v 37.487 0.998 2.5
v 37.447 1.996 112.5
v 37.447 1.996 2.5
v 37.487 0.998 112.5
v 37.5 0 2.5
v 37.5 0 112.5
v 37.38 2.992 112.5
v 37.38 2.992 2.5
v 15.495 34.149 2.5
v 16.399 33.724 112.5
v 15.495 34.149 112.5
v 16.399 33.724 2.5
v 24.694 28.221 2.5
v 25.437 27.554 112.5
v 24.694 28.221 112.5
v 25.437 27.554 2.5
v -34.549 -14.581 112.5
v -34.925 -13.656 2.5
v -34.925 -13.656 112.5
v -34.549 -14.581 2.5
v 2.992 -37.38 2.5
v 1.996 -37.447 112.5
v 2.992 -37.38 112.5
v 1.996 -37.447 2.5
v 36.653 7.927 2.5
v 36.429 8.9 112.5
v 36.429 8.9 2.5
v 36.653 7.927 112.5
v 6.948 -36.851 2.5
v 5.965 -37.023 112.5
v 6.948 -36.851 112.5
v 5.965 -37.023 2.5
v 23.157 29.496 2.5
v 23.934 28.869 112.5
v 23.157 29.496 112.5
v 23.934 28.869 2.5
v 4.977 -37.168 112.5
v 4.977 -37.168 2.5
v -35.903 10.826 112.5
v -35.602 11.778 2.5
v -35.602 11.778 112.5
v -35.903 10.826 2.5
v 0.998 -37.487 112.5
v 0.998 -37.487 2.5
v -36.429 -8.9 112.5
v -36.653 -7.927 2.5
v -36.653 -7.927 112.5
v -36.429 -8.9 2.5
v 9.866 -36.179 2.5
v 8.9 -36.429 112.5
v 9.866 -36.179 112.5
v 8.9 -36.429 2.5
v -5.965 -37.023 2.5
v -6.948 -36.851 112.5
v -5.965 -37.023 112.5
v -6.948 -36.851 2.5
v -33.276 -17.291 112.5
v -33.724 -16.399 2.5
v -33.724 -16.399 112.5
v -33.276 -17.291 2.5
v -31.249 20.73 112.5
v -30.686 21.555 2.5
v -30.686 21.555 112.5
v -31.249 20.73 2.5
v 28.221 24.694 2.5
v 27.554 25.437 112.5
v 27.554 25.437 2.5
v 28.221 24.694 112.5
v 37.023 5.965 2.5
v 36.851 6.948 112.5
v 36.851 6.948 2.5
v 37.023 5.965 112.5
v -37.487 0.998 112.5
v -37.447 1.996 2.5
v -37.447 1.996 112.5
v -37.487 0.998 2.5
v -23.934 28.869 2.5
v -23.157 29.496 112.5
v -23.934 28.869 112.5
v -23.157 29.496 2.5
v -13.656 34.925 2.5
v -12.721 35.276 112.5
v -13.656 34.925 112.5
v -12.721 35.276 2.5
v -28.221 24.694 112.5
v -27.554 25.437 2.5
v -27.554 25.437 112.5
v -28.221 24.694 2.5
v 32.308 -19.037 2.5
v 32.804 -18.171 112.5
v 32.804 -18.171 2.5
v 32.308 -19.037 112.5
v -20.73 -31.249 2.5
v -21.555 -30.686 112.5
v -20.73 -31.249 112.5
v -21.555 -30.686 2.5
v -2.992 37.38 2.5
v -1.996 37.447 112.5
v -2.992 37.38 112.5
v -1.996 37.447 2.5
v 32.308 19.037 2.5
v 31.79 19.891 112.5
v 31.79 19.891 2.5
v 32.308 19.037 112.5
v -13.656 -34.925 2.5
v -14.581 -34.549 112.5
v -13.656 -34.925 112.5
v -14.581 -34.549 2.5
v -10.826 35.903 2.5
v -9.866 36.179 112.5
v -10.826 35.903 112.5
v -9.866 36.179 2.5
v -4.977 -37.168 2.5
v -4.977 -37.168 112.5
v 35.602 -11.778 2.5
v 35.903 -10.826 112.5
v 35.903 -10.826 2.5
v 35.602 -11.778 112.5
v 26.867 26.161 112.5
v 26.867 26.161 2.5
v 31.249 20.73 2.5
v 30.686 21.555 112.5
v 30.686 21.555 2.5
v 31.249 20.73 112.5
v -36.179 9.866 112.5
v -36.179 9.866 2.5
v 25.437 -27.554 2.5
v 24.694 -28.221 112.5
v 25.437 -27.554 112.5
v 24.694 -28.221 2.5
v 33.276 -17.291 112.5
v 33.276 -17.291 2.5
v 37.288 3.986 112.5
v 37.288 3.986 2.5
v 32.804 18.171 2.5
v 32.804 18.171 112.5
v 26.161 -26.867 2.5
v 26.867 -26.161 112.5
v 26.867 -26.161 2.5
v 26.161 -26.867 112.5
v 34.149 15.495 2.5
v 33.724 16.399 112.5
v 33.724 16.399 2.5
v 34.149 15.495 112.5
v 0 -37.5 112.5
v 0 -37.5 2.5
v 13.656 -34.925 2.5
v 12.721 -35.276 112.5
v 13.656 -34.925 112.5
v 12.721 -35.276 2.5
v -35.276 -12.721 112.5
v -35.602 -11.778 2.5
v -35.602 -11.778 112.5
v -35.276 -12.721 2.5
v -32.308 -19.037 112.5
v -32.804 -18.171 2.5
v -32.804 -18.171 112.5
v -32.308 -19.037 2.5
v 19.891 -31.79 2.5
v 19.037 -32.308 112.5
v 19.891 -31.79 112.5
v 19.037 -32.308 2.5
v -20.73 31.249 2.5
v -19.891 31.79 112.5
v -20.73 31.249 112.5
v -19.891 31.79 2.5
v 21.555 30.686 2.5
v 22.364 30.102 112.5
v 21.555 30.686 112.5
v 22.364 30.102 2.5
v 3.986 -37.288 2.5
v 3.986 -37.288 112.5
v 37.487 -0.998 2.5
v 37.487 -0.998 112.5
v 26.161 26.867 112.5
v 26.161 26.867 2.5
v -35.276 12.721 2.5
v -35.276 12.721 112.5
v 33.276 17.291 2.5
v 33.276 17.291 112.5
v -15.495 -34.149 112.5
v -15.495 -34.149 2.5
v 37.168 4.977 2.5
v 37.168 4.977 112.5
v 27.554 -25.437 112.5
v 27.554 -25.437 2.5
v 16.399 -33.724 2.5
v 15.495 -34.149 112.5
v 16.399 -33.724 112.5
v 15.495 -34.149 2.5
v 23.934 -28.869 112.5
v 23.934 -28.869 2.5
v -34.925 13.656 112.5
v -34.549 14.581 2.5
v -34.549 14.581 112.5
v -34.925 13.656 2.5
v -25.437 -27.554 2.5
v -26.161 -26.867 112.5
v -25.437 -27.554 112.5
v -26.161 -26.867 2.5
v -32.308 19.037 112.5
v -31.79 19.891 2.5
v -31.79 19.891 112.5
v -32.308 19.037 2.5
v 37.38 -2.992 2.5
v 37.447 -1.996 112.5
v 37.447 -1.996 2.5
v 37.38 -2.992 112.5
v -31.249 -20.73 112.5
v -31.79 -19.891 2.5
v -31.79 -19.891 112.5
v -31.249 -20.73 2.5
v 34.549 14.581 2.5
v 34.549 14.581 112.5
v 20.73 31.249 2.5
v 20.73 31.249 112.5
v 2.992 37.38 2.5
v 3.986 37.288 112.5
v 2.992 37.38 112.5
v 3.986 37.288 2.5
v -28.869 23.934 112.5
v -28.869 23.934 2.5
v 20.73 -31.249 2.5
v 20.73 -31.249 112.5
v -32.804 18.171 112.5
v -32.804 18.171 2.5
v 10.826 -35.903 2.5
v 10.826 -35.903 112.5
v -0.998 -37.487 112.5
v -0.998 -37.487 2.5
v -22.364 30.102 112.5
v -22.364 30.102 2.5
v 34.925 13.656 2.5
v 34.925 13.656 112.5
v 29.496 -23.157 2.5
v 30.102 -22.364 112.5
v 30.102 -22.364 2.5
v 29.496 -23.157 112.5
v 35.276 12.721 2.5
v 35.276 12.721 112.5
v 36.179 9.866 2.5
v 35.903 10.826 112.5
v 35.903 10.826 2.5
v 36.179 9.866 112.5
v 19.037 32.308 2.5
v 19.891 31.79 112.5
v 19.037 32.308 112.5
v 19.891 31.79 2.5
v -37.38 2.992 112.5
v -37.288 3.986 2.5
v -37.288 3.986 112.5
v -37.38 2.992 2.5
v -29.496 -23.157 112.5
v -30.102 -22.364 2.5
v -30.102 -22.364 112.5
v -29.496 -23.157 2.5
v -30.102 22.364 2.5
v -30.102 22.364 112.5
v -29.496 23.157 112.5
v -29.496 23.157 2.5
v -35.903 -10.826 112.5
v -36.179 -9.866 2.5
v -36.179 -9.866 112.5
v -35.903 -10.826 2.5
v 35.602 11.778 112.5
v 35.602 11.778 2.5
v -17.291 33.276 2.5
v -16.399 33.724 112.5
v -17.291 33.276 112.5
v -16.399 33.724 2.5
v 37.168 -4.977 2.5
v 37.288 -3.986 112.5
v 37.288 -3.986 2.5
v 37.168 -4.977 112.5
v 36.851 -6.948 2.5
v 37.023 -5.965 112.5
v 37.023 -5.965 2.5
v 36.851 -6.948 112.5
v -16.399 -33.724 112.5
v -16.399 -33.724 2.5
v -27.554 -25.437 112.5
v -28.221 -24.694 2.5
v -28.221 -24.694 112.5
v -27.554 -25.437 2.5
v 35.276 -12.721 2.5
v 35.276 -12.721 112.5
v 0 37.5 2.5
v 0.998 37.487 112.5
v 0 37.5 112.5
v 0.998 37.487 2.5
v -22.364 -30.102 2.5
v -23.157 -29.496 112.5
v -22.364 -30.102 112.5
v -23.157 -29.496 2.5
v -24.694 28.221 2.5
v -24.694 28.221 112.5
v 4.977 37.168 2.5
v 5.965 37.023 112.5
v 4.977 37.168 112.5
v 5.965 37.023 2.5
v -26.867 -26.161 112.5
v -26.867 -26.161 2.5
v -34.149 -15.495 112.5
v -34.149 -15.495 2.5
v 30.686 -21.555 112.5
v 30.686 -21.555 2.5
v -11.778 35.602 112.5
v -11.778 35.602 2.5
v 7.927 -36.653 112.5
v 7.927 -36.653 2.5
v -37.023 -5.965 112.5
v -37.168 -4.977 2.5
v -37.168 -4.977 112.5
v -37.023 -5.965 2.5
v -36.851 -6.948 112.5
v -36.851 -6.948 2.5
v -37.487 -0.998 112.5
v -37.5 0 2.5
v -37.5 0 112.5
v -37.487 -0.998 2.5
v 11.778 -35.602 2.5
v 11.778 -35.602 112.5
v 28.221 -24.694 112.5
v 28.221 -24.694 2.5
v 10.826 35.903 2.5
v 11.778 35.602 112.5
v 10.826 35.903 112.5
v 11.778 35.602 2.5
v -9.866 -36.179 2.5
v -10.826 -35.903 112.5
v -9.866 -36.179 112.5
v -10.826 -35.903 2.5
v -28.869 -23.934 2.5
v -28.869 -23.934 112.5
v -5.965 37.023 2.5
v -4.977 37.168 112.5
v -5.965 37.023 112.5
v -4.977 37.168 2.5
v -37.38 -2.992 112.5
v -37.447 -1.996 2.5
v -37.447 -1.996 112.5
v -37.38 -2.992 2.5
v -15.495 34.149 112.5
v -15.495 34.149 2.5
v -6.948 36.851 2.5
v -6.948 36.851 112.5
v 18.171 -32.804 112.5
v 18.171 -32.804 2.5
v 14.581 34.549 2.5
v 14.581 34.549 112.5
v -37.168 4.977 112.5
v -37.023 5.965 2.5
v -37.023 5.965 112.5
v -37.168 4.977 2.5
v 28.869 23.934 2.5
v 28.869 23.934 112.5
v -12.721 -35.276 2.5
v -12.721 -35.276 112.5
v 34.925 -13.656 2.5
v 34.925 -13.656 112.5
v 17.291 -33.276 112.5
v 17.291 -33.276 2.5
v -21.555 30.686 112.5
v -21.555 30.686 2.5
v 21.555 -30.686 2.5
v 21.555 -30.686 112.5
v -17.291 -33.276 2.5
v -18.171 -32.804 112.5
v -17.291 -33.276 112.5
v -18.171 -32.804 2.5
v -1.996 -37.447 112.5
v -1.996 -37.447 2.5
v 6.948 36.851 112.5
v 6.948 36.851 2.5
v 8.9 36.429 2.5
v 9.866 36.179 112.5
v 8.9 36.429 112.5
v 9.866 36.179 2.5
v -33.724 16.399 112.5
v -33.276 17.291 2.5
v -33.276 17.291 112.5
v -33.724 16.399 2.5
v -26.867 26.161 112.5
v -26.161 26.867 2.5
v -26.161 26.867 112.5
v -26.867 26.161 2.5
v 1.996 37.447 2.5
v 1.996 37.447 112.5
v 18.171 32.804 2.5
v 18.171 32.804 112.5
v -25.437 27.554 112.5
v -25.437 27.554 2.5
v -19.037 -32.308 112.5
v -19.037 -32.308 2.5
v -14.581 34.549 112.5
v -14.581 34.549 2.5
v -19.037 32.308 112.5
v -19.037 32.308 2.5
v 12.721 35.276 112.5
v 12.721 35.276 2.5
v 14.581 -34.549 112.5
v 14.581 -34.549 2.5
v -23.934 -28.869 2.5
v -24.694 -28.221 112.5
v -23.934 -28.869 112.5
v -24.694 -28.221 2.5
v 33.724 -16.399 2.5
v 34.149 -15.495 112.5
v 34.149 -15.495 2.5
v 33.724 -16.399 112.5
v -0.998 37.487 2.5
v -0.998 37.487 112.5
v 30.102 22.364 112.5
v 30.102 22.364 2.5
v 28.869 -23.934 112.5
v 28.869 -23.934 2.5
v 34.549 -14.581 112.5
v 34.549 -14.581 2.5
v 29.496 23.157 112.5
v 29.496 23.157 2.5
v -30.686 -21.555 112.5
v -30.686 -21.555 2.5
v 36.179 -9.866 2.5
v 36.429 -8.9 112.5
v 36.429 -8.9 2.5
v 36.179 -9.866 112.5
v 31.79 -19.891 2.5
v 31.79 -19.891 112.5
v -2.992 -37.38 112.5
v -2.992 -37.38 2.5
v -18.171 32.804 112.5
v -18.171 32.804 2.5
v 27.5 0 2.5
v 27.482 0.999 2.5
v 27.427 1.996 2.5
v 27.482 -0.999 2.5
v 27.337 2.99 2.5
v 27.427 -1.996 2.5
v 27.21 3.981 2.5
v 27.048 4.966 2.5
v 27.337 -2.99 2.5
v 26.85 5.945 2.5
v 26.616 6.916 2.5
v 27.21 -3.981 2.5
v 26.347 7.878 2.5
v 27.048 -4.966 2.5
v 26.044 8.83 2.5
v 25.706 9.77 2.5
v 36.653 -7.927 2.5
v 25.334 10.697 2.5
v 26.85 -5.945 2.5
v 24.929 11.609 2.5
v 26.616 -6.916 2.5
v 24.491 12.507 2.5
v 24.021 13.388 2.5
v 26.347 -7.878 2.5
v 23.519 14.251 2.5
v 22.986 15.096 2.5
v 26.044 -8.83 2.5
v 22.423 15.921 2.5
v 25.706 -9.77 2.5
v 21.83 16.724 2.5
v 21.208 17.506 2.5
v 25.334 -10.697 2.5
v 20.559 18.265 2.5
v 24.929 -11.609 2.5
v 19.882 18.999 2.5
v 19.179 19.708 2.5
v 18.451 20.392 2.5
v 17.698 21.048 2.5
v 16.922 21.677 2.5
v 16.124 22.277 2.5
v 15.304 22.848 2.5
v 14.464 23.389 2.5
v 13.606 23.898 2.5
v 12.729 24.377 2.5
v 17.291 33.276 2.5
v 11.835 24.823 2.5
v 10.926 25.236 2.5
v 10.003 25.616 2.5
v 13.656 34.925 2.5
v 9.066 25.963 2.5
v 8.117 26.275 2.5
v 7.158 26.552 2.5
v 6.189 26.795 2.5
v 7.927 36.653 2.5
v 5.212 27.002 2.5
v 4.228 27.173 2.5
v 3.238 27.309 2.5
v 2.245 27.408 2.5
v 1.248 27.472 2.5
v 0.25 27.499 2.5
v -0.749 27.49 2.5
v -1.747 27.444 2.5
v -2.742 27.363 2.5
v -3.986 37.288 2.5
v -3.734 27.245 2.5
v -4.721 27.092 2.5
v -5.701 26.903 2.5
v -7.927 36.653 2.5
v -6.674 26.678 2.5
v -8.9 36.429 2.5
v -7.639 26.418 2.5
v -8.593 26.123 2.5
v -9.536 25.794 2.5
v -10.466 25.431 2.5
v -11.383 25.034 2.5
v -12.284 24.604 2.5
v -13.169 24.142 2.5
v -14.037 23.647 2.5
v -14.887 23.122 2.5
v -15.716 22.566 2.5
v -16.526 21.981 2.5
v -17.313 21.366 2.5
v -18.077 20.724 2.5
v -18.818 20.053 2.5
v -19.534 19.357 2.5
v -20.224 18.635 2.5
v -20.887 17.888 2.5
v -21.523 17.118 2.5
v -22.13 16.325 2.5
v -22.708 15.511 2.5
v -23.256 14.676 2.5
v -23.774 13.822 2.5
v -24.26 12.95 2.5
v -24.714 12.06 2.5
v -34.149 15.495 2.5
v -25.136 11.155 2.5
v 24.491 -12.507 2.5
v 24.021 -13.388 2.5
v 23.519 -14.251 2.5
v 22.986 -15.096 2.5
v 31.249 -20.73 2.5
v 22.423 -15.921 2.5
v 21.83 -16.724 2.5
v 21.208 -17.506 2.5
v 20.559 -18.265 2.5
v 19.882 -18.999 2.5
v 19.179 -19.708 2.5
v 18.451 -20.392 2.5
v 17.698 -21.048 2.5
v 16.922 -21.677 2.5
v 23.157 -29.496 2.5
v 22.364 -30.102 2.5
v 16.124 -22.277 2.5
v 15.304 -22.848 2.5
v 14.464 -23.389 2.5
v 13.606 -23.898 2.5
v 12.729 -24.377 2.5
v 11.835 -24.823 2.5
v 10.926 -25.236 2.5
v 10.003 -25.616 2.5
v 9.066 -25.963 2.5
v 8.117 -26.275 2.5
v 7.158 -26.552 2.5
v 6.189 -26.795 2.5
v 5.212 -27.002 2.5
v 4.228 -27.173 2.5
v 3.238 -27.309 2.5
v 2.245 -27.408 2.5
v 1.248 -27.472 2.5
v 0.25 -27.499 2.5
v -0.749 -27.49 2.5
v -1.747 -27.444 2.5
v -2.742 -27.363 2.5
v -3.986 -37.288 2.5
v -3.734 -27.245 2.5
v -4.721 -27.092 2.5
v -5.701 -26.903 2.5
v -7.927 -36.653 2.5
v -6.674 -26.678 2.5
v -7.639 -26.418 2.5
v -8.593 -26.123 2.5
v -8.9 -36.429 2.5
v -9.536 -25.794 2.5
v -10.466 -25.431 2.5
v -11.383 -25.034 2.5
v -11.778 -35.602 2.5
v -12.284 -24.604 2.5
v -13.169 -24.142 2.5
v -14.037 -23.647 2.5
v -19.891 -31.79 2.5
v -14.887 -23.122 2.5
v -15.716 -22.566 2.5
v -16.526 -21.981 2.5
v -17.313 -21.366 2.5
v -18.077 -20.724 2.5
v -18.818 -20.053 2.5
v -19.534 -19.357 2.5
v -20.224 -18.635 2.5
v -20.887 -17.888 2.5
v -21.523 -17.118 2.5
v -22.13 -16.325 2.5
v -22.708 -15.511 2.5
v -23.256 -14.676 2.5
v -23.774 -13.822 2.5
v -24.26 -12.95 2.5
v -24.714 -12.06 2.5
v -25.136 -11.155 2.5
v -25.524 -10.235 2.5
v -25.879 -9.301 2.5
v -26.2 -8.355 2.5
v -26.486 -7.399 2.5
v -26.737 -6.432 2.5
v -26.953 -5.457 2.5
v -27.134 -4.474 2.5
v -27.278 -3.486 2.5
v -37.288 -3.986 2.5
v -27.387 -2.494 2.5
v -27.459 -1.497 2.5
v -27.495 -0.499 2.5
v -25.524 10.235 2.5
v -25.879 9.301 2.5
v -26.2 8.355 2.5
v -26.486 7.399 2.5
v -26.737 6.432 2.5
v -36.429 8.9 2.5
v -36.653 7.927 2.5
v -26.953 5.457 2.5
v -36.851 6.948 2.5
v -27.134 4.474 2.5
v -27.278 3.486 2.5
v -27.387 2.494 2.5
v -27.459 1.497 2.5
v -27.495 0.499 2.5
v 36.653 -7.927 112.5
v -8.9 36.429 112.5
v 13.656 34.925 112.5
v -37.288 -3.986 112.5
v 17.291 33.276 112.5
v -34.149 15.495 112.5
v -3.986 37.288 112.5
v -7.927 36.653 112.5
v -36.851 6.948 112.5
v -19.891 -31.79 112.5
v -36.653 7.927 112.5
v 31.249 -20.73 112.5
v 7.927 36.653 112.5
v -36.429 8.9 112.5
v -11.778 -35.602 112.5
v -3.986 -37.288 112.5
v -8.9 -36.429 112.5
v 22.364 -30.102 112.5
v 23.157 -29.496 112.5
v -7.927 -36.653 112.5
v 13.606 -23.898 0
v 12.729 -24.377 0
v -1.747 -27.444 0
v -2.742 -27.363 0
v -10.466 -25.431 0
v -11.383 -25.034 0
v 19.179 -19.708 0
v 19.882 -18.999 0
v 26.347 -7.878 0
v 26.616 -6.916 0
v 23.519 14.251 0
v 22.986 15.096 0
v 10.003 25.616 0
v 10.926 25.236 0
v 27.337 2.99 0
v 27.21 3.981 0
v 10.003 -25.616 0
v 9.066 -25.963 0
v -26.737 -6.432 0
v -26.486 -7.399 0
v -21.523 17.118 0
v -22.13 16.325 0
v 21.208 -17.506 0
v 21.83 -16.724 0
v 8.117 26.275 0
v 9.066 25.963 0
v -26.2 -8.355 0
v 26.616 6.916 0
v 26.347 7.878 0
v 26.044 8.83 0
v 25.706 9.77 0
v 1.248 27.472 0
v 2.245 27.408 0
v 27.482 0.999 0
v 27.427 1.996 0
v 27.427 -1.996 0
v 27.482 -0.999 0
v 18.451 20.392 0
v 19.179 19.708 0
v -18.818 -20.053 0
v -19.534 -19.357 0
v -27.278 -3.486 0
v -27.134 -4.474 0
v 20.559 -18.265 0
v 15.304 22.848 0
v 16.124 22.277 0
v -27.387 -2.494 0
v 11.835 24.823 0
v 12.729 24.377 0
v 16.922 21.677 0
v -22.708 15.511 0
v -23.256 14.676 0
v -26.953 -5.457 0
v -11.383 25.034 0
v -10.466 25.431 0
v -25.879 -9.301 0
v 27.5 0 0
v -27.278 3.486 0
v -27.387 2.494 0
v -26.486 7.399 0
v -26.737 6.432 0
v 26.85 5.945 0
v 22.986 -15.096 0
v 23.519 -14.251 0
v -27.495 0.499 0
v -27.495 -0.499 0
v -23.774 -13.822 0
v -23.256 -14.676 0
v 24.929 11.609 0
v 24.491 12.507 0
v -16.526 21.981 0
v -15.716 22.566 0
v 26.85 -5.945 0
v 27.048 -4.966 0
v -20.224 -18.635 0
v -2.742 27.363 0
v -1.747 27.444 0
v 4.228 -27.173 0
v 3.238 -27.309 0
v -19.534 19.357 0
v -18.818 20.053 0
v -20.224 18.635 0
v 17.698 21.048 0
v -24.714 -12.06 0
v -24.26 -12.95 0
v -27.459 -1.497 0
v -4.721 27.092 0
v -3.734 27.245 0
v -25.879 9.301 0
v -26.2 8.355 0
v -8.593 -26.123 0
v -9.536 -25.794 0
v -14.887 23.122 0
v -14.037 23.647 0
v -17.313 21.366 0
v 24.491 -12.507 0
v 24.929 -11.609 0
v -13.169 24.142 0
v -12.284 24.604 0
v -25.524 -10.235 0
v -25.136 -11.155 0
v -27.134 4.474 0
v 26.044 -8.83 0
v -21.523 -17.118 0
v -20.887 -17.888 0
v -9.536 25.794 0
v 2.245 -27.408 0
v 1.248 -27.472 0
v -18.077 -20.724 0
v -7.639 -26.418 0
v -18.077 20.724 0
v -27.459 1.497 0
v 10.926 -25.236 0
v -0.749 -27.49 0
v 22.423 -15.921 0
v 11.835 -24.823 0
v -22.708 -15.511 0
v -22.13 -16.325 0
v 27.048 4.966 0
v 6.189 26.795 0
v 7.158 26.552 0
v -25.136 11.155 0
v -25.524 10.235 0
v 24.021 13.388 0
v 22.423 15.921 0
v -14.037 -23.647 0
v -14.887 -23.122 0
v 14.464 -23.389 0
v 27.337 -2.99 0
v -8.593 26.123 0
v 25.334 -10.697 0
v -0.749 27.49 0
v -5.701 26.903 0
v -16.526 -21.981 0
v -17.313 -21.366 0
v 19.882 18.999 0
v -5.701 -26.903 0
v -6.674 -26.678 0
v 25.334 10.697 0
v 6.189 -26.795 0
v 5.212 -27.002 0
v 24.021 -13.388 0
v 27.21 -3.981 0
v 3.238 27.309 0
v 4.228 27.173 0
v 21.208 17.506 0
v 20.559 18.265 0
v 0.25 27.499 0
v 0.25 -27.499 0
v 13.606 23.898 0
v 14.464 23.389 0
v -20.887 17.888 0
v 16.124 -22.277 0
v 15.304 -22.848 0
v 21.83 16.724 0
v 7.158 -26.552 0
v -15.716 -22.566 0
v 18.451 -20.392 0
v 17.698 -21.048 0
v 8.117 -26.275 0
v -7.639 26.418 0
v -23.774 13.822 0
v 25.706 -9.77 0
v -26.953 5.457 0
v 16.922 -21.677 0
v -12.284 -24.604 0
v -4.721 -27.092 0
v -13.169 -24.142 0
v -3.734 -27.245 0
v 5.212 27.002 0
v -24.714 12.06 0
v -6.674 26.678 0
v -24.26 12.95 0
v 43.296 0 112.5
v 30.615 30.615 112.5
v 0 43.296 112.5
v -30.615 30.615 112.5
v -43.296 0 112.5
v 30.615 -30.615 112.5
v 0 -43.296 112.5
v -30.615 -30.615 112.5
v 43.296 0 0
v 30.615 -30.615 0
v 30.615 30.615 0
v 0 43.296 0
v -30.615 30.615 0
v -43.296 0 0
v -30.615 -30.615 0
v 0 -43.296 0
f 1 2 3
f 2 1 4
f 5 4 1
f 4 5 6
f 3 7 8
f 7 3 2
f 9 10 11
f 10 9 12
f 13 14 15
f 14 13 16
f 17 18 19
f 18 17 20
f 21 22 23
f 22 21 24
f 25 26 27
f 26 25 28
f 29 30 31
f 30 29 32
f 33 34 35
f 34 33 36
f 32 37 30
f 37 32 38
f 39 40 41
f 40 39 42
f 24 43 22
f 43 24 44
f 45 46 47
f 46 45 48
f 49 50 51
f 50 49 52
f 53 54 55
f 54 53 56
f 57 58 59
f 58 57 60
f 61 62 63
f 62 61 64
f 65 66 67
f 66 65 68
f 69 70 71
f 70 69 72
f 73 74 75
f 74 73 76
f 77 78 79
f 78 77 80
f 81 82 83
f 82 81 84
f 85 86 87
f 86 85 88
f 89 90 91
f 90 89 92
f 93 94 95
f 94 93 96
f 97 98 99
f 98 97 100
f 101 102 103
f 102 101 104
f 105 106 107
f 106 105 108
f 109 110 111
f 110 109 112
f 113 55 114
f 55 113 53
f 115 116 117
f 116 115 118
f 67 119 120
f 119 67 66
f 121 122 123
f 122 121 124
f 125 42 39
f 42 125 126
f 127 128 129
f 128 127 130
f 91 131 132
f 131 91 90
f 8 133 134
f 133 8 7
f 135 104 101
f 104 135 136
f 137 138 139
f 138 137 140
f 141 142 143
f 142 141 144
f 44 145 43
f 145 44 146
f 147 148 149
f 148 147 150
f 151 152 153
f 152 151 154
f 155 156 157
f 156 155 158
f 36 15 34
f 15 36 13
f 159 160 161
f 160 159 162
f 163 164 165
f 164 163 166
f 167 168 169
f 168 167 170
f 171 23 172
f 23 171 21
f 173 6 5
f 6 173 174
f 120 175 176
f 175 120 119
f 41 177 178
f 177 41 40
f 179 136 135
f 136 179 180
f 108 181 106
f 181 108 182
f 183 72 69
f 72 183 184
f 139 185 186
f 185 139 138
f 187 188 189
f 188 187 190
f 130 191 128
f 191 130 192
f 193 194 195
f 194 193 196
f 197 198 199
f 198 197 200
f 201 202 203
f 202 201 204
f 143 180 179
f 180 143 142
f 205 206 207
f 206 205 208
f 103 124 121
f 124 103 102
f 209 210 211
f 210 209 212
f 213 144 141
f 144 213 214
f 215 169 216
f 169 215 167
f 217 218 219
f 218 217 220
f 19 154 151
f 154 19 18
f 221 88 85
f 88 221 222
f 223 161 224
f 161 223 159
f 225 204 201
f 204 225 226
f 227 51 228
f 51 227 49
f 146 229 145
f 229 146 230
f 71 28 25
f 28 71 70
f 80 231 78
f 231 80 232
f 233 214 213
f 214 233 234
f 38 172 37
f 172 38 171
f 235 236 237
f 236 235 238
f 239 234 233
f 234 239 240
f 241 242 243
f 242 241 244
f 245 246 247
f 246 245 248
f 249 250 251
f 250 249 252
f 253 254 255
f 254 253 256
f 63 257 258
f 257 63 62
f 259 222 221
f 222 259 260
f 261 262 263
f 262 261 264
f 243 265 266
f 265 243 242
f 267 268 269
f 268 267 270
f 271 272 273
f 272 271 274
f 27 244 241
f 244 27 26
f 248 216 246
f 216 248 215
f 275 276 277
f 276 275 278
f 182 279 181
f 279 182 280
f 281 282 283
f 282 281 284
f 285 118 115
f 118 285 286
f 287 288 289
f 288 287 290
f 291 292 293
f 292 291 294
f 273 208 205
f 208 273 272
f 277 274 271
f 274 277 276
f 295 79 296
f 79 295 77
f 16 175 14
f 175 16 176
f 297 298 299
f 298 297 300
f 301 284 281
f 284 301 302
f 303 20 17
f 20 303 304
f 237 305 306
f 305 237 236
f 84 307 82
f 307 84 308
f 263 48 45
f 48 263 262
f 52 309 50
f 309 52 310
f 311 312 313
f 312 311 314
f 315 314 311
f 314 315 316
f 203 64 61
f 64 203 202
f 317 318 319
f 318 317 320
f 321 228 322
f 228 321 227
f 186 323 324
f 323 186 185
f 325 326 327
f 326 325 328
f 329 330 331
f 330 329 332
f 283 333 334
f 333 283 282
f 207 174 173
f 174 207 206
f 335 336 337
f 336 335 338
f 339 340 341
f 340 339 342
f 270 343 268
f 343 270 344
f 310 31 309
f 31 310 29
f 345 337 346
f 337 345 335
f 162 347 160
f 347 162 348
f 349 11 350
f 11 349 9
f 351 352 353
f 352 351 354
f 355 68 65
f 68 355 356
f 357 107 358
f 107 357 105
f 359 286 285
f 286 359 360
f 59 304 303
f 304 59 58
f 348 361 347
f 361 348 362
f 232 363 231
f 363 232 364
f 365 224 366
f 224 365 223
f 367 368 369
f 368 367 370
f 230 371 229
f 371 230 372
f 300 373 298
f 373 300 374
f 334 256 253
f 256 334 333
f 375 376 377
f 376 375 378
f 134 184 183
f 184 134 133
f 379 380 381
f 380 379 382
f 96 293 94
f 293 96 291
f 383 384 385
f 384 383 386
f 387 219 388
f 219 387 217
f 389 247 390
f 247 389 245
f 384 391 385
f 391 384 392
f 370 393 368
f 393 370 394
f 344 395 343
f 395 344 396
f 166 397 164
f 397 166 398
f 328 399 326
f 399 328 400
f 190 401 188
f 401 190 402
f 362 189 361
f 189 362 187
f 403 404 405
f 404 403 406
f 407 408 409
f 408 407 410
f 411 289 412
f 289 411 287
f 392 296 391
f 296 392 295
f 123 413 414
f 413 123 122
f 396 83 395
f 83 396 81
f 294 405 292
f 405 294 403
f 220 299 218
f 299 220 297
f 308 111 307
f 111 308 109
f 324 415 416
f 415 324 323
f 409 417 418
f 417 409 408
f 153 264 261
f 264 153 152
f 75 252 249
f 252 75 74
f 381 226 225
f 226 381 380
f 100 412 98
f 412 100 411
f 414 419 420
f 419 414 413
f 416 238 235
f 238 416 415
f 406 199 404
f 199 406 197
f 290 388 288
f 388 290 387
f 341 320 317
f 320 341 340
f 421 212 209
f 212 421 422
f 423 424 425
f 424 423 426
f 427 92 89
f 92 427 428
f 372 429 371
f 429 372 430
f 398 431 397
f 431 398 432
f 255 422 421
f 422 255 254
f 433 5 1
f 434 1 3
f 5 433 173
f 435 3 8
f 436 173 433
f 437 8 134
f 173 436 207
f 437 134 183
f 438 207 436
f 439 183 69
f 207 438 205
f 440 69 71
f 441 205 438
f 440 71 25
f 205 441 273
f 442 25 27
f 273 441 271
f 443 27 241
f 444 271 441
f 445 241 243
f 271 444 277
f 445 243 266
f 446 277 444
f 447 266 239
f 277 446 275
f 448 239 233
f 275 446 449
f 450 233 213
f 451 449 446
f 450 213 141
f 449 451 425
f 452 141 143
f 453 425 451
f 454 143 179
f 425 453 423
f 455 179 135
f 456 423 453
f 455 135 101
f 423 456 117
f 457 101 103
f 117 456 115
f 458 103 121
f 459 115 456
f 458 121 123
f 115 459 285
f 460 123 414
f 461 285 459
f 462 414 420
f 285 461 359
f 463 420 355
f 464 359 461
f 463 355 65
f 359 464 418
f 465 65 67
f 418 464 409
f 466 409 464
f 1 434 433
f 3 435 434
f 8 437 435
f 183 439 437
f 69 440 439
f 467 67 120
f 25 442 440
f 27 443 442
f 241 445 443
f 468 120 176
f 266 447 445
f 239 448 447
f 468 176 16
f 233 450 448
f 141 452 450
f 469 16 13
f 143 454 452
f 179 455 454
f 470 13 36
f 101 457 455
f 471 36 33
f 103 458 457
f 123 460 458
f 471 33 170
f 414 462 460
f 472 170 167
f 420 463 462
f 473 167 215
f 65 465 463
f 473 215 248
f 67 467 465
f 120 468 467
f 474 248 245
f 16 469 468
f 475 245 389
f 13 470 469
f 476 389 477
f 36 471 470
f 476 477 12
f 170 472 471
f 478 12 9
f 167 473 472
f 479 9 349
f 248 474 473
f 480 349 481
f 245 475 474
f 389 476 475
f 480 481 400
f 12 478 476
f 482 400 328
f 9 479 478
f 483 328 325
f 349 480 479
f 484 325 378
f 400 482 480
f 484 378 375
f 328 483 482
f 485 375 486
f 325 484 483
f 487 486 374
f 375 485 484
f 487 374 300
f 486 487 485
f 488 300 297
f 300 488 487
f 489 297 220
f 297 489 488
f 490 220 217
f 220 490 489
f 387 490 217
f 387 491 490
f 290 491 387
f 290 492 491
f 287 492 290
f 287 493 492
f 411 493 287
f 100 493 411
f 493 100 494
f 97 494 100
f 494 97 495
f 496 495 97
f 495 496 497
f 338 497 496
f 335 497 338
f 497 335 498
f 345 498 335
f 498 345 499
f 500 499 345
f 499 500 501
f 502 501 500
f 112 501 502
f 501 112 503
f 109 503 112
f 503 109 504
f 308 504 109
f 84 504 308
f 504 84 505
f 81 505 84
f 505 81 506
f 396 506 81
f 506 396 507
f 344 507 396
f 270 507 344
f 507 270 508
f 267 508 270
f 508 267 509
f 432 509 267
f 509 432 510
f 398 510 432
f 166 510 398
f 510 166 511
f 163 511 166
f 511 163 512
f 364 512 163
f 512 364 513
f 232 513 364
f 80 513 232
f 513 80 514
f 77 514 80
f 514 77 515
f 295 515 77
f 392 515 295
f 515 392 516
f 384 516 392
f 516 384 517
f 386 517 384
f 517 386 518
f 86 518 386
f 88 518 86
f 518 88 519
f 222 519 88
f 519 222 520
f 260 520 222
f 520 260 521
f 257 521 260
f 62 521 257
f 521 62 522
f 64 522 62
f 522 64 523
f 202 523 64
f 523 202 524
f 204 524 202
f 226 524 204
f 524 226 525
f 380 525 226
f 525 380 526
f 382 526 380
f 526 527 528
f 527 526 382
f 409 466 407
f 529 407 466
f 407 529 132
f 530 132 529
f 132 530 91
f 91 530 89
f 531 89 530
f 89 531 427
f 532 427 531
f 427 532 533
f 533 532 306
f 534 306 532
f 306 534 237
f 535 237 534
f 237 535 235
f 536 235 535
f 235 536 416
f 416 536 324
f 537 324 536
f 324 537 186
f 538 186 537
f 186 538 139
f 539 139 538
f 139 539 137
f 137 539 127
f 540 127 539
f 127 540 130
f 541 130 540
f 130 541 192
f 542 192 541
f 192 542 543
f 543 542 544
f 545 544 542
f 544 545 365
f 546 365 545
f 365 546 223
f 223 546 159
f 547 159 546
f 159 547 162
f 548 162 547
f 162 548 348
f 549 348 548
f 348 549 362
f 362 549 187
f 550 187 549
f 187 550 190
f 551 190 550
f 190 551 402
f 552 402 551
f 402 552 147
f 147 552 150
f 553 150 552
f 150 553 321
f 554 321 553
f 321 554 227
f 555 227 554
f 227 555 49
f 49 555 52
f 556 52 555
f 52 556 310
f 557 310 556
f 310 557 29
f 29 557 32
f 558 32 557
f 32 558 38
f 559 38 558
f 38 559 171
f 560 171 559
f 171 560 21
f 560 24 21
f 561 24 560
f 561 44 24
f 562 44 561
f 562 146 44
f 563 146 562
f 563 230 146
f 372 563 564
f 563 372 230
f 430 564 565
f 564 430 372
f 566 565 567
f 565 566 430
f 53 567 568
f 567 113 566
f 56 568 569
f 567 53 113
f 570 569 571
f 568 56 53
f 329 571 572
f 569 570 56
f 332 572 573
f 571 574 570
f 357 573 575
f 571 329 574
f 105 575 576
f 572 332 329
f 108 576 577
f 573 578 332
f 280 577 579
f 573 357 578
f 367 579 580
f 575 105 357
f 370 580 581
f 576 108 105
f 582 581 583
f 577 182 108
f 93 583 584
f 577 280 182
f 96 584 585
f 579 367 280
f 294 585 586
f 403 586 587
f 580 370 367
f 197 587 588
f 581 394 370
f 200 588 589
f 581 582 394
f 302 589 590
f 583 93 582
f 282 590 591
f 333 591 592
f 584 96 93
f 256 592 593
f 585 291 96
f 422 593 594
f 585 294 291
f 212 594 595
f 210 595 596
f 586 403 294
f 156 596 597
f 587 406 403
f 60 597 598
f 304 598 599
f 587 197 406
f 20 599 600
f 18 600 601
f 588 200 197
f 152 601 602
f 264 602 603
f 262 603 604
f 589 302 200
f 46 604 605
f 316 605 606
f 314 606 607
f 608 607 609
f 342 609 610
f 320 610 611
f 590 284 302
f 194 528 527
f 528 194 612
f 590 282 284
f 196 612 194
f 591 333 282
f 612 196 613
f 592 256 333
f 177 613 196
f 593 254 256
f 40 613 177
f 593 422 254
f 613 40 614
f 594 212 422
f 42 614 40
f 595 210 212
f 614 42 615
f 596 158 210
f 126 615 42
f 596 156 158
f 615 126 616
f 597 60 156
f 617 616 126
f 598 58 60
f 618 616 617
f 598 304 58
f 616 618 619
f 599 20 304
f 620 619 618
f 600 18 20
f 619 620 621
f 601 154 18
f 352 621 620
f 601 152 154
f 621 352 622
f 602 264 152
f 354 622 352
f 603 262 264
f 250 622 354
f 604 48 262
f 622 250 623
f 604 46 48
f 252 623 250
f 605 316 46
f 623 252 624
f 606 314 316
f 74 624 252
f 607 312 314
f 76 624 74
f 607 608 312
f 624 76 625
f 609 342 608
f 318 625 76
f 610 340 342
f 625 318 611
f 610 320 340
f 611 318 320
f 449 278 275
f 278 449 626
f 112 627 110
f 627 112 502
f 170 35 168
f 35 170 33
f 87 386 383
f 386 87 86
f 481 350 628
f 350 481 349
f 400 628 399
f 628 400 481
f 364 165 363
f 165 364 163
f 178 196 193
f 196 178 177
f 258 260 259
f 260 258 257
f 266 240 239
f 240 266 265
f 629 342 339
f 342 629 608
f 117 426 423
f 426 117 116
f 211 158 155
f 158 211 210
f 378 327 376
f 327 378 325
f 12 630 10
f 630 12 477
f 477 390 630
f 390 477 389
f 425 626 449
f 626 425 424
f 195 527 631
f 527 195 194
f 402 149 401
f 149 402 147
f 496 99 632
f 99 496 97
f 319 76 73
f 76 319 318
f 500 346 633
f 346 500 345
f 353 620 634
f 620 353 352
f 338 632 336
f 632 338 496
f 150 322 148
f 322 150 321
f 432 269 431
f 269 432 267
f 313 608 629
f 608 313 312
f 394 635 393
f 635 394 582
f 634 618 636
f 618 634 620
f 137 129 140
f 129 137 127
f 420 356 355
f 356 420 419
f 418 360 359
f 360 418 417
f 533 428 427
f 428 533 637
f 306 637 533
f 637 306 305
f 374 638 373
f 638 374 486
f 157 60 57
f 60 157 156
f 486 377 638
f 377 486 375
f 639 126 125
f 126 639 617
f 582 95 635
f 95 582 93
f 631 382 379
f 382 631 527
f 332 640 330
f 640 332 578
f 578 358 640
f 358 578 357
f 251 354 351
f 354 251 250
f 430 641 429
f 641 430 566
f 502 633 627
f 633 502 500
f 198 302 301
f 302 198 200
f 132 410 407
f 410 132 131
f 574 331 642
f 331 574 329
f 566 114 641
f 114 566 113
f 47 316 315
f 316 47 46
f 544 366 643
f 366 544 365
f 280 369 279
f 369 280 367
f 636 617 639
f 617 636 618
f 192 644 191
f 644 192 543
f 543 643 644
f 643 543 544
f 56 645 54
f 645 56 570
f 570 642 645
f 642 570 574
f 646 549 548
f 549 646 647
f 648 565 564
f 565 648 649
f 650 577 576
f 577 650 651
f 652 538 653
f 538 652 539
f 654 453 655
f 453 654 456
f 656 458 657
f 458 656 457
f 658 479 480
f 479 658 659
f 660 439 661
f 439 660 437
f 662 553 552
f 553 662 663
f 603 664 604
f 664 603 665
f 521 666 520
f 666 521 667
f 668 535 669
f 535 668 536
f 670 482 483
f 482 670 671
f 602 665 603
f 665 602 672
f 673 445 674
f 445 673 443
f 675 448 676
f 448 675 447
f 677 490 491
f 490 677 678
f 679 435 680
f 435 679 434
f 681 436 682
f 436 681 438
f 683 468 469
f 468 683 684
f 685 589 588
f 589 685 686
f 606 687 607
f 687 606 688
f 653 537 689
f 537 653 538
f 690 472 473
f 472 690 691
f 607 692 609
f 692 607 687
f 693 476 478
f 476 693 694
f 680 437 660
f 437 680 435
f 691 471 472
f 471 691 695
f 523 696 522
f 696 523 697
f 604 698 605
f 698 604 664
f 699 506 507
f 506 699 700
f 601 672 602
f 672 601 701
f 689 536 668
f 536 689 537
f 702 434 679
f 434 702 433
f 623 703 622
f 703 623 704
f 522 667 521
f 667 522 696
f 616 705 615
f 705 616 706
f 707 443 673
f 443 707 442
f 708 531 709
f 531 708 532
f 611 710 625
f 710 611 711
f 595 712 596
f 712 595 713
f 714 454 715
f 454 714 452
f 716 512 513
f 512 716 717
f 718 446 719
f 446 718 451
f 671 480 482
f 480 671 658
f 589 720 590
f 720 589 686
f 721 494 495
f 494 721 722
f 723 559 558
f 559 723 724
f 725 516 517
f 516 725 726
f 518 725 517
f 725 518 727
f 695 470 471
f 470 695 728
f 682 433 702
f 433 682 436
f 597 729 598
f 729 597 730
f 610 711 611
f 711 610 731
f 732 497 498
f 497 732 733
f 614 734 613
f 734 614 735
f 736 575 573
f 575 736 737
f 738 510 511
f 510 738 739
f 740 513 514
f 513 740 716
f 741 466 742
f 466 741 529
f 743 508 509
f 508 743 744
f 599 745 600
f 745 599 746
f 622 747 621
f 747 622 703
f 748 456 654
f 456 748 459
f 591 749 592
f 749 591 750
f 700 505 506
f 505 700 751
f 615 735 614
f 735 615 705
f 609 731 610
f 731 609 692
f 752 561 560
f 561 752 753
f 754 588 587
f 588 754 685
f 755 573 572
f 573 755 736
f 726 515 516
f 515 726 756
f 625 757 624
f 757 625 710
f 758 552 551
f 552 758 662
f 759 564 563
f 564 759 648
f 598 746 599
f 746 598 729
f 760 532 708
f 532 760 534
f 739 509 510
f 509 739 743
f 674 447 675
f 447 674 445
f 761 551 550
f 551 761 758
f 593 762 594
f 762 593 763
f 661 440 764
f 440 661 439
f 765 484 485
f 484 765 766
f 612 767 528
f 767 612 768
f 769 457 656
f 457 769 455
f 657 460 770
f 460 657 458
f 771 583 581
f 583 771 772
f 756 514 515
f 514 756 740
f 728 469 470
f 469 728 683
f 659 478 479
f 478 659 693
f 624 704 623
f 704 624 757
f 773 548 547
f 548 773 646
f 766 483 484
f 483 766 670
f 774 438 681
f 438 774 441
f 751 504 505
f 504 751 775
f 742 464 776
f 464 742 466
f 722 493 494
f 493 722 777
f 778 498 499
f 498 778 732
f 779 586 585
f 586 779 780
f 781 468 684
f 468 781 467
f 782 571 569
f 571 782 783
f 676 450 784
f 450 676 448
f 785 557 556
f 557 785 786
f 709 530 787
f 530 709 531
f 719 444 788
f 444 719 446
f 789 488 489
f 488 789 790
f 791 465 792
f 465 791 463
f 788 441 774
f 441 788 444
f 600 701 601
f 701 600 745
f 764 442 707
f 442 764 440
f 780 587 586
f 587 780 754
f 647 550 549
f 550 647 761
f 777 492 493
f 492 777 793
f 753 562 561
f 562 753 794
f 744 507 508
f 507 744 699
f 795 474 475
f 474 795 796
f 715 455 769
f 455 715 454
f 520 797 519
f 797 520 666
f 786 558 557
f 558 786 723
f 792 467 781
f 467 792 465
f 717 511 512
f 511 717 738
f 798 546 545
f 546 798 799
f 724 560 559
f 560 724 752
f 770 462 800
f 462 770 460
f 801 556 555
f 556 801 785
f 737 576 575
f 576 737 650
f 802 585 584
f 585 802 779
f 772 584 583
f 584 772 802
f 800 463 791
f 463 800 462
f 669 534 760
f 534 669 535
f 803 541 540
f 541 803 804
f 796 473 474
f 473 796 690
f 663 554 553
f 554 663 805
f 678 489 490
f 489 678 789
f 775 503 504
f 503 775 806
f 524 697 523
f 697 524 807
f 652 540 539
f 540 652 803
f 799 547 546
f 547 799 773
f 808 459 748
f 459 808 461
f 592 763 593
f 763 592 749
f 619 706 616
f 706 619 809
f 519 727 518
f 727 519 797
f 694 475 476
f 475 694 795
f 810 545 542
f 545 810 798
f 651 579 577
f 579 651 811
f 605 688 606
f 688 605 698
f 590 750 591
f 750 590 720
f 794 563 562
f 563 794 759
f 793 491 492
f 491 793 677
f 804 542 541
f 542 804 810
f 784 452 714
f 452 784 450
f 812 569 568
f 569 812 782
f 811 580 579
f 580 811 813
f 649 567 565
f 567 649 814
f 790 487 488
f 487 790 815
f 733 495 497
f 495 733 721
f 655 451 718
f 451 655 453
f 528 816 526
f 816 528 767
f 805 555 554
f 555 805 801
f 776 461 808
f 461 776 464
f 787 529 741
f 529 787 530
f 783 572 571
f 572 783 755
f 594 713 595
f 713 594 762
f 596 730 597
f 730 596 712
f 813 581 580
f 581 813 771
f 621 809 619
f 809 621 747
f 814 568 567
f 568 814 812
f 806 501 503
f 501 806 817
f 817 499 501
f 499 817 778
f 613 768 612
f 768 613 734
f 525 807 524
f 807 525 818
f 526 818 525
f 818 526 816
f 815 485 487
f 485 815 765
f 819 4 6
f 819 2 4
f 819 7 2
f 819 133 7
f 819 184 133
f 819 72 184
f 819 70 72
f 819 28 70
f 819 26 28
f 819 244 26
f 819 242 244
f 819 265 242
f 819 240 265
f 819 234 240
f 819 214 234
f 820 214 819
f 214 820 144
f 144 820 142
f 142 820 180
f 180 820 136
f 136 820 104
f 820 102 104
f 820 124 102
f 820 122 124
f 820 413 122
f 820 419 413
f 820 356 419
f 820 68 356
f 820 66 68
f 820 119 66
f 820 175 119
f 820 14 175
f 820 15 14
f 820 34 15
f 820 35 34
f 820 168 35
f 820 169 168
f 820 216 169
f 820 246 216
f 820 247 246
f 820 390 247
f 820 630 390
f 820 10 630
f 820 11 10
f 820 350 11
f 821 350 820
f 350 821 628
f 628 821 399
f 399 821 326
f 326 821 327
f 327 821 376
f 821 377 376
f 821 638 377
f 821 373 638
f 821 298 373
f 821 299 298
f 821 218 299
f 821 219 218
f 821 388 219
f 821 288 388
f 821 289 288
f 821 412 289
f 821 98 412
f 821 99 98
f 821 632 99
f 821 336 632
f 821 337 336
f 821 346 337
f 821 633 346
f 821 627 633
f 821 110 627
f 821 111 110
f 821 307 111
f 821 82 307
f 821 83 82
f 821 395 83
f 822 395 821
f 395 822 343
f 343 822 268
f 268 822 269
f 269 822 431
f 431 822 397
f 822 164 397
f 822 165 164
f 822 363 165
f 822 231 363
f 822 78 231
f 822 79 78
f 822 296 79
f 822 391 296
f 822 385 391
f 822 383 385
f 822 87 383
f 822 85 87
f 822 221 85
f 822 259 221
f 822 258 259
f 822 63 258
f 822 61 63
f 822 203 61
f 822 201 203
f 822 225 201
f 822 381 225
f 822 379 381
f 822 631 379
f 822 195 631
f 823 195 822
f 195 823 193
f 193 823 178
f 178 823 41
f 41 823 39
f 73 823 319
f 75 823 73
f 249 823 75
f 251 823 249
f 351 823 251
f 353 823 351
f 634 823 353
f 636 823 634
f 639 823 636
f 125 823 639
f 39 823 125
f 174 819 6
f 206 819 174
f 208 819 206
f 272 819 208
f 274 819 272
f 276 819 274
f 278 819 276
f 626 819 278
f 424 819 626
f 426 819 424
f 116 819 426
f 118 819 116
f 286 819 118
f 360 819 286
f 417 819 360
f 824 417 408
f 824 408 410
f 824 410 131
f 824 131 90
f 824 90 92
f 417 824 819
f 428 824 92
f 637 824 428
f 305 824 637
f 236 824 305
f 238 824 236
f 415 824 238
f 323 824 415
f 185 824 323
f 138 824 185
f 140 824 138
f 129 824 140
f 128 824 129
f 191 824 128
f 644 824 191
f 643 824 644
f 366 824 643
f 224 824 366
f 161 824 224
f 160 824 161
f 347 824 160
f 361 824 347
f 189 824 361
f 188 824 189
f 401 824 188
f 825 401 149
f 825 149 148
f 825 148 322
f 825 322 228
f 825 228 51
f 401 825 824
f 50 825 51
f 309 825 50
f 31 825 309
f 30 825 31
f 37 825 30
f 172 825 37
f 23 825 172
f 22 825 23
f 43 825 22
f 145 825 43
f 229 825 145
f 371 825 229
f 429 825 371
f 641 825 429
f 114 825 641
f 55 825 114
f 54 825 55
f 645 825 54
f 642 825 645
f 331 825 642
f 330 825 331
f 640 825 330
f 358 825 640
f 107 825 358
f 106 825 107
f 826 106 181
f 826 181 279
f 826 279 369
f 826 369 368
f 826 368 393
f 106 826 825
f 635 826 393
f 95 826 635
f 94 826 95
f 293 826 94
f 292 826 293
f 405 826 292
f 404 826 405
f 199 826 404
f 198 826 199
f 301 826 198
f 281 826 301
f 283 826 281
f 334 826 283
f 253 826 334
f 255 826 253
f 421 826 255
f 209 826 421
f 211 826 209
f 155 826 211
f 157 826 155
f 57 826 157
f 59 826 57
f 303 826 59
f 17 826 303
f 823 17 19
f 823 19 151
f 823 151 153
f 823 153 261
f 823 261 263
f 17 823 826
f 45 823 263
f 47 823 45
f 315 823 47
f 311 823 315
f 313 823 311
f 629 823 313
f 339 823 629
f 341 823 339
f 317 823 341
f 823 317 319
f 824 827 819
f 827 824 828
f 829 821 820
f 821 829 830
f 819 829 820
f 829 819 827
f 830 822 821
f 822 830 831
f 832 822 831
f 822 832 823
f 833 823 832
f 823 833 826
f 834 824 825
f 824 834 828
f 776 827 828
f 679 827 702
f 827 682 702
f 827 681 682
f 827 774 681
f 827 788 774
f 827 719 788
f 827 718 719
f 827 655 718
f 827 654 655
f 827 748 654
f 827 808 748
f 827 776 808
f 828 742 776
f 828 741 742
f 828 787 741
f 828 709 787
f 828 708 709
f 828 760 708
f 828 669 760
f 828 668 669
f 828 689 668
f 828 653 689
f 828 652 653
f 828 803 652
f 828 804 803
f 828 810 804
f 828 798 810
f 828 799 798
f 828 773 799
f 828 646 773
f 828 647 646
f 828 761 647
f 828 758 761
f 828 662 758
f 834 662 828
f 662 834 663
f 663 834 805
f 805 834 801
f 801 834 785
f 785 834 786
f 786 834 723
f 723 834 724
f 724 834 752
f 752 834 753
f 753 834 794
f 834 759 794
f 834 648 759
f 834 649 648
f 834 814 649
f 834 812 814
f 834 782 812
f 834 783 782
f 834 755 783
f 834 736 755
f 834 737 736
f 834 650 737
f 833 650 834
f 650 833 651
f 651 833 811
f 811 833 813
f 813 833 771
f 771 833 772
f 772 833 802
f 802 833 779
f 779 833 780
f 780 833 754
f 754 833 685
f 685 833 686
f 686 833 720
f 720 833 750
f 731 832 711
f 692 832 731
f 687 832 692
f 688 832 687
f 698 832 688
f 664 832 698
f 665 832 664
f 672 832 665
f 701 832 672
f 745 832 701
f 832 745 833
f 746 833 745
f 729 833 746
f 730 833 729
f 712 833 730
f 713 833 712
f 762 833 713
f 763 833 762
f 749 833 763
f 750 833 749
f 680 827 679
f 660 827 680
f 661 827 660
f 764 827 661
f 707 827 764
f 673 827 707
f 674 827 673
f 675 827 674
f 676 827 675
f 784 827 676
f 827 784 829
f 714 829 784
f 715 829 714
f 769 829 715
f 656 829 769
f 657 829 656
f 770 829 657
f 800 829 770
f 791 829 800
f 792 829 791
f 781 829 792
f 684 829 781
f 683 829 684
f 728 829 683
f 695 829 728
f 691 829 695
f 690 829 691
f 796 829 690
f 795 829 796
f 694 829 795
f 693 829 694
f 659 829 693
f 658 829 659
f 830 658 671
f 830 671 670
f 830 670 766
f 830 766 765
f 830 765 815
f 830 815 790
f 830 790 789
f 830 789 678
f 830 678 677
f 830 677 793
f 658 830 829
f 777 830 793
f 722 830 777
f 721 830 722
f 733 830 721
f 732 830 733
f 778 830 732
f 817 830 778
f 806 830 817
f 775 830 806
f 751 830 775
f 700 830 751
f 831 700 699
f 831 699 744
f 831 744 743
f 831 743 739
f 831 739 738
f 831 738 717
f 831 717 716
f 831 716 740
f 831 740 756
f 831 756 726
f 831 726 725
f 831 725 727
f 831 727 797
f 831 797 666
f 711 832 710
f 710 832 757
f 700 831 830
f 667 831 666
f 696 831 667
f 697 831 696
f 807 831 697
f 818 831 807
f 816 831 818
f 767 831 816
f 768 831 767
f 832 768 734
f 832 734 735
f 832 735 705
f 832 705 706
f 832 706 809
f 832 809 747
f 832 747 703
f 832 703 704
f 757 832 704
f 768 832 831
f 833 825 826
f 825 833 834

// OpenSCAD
// Paneled cache pot core.

// ---------- Public parameters (mm) ----------
inside_radius = 75 / 2;
inside_height = 110;
min_wall_thickness = 2.5;
bottom_thickness = 2.5;
bottom_edge_width = 10;
num_panels = 8;
panel_thickness = 2.5;

// ---------- Resolution ----------
$fa = 1;
$fs = 1;

// ---------- Derived ----------
outside_height = inside_height + bottom_thickness;
outside_radius = (inside_radius + min_wall_thickness) / cos(180 / num_panels);

module outside_cylinder() {
  cylinder(outside_height, outside_radius, outside_radius, $fn = num_panels);
}

module inside_cutout() {
  translate([0, 0, bottom_thickness])
    cylinder(inside_height + 1, inside_radius, inside_radius);
  translate([0, 0, -0.5 * bottom_thickness])
    cylinder(2 * bottom_thickness, inside_radius - bottom_edge_width, inside_radius - bottom_edge_width);
}

module core() {
  difference() {
    outside_cylinder();
    inside_cutout();
  }
}

module panel() {
  difference() {
    cylinder(outside_height, outside_radius + panel_thickness, outside_radius + panel_thickness, $fn = num_panels);
    translate([0, 0, -1])
      cylinder(outside_height + 2, outside_radius, outside_radius, $fn = num_panels);
    translate([-(outside_radius + panel_thickness + 1), 0, -1])
      cube([2 * (outside_radius + panel_thickness + 1), 2 * (outside_radius + panel_thickness + 1), outside_height + 2]);
    rotate([0, 0, 180 - 360 / num_panels])
      translate([-(outside_radius + panel_thickness + 1), 0, -1])
        cube([2 * (outside_radius + panel_thickness + 1), 2 * (outside_radius + panel_thickness + 1), outside_height + 2]);
  }
}

module panel_flat_on_bed() {
  translate([outside_height / 2, 0, -(inside_radius + min_wall_thickness)])
    rotate([0, -90, 0])
      rotate([0, 0, 180 / num_panels])
        panel();
}

//color("blue") panel_flat_on_bed();
//color("red") panel();
color("yellow") core();
